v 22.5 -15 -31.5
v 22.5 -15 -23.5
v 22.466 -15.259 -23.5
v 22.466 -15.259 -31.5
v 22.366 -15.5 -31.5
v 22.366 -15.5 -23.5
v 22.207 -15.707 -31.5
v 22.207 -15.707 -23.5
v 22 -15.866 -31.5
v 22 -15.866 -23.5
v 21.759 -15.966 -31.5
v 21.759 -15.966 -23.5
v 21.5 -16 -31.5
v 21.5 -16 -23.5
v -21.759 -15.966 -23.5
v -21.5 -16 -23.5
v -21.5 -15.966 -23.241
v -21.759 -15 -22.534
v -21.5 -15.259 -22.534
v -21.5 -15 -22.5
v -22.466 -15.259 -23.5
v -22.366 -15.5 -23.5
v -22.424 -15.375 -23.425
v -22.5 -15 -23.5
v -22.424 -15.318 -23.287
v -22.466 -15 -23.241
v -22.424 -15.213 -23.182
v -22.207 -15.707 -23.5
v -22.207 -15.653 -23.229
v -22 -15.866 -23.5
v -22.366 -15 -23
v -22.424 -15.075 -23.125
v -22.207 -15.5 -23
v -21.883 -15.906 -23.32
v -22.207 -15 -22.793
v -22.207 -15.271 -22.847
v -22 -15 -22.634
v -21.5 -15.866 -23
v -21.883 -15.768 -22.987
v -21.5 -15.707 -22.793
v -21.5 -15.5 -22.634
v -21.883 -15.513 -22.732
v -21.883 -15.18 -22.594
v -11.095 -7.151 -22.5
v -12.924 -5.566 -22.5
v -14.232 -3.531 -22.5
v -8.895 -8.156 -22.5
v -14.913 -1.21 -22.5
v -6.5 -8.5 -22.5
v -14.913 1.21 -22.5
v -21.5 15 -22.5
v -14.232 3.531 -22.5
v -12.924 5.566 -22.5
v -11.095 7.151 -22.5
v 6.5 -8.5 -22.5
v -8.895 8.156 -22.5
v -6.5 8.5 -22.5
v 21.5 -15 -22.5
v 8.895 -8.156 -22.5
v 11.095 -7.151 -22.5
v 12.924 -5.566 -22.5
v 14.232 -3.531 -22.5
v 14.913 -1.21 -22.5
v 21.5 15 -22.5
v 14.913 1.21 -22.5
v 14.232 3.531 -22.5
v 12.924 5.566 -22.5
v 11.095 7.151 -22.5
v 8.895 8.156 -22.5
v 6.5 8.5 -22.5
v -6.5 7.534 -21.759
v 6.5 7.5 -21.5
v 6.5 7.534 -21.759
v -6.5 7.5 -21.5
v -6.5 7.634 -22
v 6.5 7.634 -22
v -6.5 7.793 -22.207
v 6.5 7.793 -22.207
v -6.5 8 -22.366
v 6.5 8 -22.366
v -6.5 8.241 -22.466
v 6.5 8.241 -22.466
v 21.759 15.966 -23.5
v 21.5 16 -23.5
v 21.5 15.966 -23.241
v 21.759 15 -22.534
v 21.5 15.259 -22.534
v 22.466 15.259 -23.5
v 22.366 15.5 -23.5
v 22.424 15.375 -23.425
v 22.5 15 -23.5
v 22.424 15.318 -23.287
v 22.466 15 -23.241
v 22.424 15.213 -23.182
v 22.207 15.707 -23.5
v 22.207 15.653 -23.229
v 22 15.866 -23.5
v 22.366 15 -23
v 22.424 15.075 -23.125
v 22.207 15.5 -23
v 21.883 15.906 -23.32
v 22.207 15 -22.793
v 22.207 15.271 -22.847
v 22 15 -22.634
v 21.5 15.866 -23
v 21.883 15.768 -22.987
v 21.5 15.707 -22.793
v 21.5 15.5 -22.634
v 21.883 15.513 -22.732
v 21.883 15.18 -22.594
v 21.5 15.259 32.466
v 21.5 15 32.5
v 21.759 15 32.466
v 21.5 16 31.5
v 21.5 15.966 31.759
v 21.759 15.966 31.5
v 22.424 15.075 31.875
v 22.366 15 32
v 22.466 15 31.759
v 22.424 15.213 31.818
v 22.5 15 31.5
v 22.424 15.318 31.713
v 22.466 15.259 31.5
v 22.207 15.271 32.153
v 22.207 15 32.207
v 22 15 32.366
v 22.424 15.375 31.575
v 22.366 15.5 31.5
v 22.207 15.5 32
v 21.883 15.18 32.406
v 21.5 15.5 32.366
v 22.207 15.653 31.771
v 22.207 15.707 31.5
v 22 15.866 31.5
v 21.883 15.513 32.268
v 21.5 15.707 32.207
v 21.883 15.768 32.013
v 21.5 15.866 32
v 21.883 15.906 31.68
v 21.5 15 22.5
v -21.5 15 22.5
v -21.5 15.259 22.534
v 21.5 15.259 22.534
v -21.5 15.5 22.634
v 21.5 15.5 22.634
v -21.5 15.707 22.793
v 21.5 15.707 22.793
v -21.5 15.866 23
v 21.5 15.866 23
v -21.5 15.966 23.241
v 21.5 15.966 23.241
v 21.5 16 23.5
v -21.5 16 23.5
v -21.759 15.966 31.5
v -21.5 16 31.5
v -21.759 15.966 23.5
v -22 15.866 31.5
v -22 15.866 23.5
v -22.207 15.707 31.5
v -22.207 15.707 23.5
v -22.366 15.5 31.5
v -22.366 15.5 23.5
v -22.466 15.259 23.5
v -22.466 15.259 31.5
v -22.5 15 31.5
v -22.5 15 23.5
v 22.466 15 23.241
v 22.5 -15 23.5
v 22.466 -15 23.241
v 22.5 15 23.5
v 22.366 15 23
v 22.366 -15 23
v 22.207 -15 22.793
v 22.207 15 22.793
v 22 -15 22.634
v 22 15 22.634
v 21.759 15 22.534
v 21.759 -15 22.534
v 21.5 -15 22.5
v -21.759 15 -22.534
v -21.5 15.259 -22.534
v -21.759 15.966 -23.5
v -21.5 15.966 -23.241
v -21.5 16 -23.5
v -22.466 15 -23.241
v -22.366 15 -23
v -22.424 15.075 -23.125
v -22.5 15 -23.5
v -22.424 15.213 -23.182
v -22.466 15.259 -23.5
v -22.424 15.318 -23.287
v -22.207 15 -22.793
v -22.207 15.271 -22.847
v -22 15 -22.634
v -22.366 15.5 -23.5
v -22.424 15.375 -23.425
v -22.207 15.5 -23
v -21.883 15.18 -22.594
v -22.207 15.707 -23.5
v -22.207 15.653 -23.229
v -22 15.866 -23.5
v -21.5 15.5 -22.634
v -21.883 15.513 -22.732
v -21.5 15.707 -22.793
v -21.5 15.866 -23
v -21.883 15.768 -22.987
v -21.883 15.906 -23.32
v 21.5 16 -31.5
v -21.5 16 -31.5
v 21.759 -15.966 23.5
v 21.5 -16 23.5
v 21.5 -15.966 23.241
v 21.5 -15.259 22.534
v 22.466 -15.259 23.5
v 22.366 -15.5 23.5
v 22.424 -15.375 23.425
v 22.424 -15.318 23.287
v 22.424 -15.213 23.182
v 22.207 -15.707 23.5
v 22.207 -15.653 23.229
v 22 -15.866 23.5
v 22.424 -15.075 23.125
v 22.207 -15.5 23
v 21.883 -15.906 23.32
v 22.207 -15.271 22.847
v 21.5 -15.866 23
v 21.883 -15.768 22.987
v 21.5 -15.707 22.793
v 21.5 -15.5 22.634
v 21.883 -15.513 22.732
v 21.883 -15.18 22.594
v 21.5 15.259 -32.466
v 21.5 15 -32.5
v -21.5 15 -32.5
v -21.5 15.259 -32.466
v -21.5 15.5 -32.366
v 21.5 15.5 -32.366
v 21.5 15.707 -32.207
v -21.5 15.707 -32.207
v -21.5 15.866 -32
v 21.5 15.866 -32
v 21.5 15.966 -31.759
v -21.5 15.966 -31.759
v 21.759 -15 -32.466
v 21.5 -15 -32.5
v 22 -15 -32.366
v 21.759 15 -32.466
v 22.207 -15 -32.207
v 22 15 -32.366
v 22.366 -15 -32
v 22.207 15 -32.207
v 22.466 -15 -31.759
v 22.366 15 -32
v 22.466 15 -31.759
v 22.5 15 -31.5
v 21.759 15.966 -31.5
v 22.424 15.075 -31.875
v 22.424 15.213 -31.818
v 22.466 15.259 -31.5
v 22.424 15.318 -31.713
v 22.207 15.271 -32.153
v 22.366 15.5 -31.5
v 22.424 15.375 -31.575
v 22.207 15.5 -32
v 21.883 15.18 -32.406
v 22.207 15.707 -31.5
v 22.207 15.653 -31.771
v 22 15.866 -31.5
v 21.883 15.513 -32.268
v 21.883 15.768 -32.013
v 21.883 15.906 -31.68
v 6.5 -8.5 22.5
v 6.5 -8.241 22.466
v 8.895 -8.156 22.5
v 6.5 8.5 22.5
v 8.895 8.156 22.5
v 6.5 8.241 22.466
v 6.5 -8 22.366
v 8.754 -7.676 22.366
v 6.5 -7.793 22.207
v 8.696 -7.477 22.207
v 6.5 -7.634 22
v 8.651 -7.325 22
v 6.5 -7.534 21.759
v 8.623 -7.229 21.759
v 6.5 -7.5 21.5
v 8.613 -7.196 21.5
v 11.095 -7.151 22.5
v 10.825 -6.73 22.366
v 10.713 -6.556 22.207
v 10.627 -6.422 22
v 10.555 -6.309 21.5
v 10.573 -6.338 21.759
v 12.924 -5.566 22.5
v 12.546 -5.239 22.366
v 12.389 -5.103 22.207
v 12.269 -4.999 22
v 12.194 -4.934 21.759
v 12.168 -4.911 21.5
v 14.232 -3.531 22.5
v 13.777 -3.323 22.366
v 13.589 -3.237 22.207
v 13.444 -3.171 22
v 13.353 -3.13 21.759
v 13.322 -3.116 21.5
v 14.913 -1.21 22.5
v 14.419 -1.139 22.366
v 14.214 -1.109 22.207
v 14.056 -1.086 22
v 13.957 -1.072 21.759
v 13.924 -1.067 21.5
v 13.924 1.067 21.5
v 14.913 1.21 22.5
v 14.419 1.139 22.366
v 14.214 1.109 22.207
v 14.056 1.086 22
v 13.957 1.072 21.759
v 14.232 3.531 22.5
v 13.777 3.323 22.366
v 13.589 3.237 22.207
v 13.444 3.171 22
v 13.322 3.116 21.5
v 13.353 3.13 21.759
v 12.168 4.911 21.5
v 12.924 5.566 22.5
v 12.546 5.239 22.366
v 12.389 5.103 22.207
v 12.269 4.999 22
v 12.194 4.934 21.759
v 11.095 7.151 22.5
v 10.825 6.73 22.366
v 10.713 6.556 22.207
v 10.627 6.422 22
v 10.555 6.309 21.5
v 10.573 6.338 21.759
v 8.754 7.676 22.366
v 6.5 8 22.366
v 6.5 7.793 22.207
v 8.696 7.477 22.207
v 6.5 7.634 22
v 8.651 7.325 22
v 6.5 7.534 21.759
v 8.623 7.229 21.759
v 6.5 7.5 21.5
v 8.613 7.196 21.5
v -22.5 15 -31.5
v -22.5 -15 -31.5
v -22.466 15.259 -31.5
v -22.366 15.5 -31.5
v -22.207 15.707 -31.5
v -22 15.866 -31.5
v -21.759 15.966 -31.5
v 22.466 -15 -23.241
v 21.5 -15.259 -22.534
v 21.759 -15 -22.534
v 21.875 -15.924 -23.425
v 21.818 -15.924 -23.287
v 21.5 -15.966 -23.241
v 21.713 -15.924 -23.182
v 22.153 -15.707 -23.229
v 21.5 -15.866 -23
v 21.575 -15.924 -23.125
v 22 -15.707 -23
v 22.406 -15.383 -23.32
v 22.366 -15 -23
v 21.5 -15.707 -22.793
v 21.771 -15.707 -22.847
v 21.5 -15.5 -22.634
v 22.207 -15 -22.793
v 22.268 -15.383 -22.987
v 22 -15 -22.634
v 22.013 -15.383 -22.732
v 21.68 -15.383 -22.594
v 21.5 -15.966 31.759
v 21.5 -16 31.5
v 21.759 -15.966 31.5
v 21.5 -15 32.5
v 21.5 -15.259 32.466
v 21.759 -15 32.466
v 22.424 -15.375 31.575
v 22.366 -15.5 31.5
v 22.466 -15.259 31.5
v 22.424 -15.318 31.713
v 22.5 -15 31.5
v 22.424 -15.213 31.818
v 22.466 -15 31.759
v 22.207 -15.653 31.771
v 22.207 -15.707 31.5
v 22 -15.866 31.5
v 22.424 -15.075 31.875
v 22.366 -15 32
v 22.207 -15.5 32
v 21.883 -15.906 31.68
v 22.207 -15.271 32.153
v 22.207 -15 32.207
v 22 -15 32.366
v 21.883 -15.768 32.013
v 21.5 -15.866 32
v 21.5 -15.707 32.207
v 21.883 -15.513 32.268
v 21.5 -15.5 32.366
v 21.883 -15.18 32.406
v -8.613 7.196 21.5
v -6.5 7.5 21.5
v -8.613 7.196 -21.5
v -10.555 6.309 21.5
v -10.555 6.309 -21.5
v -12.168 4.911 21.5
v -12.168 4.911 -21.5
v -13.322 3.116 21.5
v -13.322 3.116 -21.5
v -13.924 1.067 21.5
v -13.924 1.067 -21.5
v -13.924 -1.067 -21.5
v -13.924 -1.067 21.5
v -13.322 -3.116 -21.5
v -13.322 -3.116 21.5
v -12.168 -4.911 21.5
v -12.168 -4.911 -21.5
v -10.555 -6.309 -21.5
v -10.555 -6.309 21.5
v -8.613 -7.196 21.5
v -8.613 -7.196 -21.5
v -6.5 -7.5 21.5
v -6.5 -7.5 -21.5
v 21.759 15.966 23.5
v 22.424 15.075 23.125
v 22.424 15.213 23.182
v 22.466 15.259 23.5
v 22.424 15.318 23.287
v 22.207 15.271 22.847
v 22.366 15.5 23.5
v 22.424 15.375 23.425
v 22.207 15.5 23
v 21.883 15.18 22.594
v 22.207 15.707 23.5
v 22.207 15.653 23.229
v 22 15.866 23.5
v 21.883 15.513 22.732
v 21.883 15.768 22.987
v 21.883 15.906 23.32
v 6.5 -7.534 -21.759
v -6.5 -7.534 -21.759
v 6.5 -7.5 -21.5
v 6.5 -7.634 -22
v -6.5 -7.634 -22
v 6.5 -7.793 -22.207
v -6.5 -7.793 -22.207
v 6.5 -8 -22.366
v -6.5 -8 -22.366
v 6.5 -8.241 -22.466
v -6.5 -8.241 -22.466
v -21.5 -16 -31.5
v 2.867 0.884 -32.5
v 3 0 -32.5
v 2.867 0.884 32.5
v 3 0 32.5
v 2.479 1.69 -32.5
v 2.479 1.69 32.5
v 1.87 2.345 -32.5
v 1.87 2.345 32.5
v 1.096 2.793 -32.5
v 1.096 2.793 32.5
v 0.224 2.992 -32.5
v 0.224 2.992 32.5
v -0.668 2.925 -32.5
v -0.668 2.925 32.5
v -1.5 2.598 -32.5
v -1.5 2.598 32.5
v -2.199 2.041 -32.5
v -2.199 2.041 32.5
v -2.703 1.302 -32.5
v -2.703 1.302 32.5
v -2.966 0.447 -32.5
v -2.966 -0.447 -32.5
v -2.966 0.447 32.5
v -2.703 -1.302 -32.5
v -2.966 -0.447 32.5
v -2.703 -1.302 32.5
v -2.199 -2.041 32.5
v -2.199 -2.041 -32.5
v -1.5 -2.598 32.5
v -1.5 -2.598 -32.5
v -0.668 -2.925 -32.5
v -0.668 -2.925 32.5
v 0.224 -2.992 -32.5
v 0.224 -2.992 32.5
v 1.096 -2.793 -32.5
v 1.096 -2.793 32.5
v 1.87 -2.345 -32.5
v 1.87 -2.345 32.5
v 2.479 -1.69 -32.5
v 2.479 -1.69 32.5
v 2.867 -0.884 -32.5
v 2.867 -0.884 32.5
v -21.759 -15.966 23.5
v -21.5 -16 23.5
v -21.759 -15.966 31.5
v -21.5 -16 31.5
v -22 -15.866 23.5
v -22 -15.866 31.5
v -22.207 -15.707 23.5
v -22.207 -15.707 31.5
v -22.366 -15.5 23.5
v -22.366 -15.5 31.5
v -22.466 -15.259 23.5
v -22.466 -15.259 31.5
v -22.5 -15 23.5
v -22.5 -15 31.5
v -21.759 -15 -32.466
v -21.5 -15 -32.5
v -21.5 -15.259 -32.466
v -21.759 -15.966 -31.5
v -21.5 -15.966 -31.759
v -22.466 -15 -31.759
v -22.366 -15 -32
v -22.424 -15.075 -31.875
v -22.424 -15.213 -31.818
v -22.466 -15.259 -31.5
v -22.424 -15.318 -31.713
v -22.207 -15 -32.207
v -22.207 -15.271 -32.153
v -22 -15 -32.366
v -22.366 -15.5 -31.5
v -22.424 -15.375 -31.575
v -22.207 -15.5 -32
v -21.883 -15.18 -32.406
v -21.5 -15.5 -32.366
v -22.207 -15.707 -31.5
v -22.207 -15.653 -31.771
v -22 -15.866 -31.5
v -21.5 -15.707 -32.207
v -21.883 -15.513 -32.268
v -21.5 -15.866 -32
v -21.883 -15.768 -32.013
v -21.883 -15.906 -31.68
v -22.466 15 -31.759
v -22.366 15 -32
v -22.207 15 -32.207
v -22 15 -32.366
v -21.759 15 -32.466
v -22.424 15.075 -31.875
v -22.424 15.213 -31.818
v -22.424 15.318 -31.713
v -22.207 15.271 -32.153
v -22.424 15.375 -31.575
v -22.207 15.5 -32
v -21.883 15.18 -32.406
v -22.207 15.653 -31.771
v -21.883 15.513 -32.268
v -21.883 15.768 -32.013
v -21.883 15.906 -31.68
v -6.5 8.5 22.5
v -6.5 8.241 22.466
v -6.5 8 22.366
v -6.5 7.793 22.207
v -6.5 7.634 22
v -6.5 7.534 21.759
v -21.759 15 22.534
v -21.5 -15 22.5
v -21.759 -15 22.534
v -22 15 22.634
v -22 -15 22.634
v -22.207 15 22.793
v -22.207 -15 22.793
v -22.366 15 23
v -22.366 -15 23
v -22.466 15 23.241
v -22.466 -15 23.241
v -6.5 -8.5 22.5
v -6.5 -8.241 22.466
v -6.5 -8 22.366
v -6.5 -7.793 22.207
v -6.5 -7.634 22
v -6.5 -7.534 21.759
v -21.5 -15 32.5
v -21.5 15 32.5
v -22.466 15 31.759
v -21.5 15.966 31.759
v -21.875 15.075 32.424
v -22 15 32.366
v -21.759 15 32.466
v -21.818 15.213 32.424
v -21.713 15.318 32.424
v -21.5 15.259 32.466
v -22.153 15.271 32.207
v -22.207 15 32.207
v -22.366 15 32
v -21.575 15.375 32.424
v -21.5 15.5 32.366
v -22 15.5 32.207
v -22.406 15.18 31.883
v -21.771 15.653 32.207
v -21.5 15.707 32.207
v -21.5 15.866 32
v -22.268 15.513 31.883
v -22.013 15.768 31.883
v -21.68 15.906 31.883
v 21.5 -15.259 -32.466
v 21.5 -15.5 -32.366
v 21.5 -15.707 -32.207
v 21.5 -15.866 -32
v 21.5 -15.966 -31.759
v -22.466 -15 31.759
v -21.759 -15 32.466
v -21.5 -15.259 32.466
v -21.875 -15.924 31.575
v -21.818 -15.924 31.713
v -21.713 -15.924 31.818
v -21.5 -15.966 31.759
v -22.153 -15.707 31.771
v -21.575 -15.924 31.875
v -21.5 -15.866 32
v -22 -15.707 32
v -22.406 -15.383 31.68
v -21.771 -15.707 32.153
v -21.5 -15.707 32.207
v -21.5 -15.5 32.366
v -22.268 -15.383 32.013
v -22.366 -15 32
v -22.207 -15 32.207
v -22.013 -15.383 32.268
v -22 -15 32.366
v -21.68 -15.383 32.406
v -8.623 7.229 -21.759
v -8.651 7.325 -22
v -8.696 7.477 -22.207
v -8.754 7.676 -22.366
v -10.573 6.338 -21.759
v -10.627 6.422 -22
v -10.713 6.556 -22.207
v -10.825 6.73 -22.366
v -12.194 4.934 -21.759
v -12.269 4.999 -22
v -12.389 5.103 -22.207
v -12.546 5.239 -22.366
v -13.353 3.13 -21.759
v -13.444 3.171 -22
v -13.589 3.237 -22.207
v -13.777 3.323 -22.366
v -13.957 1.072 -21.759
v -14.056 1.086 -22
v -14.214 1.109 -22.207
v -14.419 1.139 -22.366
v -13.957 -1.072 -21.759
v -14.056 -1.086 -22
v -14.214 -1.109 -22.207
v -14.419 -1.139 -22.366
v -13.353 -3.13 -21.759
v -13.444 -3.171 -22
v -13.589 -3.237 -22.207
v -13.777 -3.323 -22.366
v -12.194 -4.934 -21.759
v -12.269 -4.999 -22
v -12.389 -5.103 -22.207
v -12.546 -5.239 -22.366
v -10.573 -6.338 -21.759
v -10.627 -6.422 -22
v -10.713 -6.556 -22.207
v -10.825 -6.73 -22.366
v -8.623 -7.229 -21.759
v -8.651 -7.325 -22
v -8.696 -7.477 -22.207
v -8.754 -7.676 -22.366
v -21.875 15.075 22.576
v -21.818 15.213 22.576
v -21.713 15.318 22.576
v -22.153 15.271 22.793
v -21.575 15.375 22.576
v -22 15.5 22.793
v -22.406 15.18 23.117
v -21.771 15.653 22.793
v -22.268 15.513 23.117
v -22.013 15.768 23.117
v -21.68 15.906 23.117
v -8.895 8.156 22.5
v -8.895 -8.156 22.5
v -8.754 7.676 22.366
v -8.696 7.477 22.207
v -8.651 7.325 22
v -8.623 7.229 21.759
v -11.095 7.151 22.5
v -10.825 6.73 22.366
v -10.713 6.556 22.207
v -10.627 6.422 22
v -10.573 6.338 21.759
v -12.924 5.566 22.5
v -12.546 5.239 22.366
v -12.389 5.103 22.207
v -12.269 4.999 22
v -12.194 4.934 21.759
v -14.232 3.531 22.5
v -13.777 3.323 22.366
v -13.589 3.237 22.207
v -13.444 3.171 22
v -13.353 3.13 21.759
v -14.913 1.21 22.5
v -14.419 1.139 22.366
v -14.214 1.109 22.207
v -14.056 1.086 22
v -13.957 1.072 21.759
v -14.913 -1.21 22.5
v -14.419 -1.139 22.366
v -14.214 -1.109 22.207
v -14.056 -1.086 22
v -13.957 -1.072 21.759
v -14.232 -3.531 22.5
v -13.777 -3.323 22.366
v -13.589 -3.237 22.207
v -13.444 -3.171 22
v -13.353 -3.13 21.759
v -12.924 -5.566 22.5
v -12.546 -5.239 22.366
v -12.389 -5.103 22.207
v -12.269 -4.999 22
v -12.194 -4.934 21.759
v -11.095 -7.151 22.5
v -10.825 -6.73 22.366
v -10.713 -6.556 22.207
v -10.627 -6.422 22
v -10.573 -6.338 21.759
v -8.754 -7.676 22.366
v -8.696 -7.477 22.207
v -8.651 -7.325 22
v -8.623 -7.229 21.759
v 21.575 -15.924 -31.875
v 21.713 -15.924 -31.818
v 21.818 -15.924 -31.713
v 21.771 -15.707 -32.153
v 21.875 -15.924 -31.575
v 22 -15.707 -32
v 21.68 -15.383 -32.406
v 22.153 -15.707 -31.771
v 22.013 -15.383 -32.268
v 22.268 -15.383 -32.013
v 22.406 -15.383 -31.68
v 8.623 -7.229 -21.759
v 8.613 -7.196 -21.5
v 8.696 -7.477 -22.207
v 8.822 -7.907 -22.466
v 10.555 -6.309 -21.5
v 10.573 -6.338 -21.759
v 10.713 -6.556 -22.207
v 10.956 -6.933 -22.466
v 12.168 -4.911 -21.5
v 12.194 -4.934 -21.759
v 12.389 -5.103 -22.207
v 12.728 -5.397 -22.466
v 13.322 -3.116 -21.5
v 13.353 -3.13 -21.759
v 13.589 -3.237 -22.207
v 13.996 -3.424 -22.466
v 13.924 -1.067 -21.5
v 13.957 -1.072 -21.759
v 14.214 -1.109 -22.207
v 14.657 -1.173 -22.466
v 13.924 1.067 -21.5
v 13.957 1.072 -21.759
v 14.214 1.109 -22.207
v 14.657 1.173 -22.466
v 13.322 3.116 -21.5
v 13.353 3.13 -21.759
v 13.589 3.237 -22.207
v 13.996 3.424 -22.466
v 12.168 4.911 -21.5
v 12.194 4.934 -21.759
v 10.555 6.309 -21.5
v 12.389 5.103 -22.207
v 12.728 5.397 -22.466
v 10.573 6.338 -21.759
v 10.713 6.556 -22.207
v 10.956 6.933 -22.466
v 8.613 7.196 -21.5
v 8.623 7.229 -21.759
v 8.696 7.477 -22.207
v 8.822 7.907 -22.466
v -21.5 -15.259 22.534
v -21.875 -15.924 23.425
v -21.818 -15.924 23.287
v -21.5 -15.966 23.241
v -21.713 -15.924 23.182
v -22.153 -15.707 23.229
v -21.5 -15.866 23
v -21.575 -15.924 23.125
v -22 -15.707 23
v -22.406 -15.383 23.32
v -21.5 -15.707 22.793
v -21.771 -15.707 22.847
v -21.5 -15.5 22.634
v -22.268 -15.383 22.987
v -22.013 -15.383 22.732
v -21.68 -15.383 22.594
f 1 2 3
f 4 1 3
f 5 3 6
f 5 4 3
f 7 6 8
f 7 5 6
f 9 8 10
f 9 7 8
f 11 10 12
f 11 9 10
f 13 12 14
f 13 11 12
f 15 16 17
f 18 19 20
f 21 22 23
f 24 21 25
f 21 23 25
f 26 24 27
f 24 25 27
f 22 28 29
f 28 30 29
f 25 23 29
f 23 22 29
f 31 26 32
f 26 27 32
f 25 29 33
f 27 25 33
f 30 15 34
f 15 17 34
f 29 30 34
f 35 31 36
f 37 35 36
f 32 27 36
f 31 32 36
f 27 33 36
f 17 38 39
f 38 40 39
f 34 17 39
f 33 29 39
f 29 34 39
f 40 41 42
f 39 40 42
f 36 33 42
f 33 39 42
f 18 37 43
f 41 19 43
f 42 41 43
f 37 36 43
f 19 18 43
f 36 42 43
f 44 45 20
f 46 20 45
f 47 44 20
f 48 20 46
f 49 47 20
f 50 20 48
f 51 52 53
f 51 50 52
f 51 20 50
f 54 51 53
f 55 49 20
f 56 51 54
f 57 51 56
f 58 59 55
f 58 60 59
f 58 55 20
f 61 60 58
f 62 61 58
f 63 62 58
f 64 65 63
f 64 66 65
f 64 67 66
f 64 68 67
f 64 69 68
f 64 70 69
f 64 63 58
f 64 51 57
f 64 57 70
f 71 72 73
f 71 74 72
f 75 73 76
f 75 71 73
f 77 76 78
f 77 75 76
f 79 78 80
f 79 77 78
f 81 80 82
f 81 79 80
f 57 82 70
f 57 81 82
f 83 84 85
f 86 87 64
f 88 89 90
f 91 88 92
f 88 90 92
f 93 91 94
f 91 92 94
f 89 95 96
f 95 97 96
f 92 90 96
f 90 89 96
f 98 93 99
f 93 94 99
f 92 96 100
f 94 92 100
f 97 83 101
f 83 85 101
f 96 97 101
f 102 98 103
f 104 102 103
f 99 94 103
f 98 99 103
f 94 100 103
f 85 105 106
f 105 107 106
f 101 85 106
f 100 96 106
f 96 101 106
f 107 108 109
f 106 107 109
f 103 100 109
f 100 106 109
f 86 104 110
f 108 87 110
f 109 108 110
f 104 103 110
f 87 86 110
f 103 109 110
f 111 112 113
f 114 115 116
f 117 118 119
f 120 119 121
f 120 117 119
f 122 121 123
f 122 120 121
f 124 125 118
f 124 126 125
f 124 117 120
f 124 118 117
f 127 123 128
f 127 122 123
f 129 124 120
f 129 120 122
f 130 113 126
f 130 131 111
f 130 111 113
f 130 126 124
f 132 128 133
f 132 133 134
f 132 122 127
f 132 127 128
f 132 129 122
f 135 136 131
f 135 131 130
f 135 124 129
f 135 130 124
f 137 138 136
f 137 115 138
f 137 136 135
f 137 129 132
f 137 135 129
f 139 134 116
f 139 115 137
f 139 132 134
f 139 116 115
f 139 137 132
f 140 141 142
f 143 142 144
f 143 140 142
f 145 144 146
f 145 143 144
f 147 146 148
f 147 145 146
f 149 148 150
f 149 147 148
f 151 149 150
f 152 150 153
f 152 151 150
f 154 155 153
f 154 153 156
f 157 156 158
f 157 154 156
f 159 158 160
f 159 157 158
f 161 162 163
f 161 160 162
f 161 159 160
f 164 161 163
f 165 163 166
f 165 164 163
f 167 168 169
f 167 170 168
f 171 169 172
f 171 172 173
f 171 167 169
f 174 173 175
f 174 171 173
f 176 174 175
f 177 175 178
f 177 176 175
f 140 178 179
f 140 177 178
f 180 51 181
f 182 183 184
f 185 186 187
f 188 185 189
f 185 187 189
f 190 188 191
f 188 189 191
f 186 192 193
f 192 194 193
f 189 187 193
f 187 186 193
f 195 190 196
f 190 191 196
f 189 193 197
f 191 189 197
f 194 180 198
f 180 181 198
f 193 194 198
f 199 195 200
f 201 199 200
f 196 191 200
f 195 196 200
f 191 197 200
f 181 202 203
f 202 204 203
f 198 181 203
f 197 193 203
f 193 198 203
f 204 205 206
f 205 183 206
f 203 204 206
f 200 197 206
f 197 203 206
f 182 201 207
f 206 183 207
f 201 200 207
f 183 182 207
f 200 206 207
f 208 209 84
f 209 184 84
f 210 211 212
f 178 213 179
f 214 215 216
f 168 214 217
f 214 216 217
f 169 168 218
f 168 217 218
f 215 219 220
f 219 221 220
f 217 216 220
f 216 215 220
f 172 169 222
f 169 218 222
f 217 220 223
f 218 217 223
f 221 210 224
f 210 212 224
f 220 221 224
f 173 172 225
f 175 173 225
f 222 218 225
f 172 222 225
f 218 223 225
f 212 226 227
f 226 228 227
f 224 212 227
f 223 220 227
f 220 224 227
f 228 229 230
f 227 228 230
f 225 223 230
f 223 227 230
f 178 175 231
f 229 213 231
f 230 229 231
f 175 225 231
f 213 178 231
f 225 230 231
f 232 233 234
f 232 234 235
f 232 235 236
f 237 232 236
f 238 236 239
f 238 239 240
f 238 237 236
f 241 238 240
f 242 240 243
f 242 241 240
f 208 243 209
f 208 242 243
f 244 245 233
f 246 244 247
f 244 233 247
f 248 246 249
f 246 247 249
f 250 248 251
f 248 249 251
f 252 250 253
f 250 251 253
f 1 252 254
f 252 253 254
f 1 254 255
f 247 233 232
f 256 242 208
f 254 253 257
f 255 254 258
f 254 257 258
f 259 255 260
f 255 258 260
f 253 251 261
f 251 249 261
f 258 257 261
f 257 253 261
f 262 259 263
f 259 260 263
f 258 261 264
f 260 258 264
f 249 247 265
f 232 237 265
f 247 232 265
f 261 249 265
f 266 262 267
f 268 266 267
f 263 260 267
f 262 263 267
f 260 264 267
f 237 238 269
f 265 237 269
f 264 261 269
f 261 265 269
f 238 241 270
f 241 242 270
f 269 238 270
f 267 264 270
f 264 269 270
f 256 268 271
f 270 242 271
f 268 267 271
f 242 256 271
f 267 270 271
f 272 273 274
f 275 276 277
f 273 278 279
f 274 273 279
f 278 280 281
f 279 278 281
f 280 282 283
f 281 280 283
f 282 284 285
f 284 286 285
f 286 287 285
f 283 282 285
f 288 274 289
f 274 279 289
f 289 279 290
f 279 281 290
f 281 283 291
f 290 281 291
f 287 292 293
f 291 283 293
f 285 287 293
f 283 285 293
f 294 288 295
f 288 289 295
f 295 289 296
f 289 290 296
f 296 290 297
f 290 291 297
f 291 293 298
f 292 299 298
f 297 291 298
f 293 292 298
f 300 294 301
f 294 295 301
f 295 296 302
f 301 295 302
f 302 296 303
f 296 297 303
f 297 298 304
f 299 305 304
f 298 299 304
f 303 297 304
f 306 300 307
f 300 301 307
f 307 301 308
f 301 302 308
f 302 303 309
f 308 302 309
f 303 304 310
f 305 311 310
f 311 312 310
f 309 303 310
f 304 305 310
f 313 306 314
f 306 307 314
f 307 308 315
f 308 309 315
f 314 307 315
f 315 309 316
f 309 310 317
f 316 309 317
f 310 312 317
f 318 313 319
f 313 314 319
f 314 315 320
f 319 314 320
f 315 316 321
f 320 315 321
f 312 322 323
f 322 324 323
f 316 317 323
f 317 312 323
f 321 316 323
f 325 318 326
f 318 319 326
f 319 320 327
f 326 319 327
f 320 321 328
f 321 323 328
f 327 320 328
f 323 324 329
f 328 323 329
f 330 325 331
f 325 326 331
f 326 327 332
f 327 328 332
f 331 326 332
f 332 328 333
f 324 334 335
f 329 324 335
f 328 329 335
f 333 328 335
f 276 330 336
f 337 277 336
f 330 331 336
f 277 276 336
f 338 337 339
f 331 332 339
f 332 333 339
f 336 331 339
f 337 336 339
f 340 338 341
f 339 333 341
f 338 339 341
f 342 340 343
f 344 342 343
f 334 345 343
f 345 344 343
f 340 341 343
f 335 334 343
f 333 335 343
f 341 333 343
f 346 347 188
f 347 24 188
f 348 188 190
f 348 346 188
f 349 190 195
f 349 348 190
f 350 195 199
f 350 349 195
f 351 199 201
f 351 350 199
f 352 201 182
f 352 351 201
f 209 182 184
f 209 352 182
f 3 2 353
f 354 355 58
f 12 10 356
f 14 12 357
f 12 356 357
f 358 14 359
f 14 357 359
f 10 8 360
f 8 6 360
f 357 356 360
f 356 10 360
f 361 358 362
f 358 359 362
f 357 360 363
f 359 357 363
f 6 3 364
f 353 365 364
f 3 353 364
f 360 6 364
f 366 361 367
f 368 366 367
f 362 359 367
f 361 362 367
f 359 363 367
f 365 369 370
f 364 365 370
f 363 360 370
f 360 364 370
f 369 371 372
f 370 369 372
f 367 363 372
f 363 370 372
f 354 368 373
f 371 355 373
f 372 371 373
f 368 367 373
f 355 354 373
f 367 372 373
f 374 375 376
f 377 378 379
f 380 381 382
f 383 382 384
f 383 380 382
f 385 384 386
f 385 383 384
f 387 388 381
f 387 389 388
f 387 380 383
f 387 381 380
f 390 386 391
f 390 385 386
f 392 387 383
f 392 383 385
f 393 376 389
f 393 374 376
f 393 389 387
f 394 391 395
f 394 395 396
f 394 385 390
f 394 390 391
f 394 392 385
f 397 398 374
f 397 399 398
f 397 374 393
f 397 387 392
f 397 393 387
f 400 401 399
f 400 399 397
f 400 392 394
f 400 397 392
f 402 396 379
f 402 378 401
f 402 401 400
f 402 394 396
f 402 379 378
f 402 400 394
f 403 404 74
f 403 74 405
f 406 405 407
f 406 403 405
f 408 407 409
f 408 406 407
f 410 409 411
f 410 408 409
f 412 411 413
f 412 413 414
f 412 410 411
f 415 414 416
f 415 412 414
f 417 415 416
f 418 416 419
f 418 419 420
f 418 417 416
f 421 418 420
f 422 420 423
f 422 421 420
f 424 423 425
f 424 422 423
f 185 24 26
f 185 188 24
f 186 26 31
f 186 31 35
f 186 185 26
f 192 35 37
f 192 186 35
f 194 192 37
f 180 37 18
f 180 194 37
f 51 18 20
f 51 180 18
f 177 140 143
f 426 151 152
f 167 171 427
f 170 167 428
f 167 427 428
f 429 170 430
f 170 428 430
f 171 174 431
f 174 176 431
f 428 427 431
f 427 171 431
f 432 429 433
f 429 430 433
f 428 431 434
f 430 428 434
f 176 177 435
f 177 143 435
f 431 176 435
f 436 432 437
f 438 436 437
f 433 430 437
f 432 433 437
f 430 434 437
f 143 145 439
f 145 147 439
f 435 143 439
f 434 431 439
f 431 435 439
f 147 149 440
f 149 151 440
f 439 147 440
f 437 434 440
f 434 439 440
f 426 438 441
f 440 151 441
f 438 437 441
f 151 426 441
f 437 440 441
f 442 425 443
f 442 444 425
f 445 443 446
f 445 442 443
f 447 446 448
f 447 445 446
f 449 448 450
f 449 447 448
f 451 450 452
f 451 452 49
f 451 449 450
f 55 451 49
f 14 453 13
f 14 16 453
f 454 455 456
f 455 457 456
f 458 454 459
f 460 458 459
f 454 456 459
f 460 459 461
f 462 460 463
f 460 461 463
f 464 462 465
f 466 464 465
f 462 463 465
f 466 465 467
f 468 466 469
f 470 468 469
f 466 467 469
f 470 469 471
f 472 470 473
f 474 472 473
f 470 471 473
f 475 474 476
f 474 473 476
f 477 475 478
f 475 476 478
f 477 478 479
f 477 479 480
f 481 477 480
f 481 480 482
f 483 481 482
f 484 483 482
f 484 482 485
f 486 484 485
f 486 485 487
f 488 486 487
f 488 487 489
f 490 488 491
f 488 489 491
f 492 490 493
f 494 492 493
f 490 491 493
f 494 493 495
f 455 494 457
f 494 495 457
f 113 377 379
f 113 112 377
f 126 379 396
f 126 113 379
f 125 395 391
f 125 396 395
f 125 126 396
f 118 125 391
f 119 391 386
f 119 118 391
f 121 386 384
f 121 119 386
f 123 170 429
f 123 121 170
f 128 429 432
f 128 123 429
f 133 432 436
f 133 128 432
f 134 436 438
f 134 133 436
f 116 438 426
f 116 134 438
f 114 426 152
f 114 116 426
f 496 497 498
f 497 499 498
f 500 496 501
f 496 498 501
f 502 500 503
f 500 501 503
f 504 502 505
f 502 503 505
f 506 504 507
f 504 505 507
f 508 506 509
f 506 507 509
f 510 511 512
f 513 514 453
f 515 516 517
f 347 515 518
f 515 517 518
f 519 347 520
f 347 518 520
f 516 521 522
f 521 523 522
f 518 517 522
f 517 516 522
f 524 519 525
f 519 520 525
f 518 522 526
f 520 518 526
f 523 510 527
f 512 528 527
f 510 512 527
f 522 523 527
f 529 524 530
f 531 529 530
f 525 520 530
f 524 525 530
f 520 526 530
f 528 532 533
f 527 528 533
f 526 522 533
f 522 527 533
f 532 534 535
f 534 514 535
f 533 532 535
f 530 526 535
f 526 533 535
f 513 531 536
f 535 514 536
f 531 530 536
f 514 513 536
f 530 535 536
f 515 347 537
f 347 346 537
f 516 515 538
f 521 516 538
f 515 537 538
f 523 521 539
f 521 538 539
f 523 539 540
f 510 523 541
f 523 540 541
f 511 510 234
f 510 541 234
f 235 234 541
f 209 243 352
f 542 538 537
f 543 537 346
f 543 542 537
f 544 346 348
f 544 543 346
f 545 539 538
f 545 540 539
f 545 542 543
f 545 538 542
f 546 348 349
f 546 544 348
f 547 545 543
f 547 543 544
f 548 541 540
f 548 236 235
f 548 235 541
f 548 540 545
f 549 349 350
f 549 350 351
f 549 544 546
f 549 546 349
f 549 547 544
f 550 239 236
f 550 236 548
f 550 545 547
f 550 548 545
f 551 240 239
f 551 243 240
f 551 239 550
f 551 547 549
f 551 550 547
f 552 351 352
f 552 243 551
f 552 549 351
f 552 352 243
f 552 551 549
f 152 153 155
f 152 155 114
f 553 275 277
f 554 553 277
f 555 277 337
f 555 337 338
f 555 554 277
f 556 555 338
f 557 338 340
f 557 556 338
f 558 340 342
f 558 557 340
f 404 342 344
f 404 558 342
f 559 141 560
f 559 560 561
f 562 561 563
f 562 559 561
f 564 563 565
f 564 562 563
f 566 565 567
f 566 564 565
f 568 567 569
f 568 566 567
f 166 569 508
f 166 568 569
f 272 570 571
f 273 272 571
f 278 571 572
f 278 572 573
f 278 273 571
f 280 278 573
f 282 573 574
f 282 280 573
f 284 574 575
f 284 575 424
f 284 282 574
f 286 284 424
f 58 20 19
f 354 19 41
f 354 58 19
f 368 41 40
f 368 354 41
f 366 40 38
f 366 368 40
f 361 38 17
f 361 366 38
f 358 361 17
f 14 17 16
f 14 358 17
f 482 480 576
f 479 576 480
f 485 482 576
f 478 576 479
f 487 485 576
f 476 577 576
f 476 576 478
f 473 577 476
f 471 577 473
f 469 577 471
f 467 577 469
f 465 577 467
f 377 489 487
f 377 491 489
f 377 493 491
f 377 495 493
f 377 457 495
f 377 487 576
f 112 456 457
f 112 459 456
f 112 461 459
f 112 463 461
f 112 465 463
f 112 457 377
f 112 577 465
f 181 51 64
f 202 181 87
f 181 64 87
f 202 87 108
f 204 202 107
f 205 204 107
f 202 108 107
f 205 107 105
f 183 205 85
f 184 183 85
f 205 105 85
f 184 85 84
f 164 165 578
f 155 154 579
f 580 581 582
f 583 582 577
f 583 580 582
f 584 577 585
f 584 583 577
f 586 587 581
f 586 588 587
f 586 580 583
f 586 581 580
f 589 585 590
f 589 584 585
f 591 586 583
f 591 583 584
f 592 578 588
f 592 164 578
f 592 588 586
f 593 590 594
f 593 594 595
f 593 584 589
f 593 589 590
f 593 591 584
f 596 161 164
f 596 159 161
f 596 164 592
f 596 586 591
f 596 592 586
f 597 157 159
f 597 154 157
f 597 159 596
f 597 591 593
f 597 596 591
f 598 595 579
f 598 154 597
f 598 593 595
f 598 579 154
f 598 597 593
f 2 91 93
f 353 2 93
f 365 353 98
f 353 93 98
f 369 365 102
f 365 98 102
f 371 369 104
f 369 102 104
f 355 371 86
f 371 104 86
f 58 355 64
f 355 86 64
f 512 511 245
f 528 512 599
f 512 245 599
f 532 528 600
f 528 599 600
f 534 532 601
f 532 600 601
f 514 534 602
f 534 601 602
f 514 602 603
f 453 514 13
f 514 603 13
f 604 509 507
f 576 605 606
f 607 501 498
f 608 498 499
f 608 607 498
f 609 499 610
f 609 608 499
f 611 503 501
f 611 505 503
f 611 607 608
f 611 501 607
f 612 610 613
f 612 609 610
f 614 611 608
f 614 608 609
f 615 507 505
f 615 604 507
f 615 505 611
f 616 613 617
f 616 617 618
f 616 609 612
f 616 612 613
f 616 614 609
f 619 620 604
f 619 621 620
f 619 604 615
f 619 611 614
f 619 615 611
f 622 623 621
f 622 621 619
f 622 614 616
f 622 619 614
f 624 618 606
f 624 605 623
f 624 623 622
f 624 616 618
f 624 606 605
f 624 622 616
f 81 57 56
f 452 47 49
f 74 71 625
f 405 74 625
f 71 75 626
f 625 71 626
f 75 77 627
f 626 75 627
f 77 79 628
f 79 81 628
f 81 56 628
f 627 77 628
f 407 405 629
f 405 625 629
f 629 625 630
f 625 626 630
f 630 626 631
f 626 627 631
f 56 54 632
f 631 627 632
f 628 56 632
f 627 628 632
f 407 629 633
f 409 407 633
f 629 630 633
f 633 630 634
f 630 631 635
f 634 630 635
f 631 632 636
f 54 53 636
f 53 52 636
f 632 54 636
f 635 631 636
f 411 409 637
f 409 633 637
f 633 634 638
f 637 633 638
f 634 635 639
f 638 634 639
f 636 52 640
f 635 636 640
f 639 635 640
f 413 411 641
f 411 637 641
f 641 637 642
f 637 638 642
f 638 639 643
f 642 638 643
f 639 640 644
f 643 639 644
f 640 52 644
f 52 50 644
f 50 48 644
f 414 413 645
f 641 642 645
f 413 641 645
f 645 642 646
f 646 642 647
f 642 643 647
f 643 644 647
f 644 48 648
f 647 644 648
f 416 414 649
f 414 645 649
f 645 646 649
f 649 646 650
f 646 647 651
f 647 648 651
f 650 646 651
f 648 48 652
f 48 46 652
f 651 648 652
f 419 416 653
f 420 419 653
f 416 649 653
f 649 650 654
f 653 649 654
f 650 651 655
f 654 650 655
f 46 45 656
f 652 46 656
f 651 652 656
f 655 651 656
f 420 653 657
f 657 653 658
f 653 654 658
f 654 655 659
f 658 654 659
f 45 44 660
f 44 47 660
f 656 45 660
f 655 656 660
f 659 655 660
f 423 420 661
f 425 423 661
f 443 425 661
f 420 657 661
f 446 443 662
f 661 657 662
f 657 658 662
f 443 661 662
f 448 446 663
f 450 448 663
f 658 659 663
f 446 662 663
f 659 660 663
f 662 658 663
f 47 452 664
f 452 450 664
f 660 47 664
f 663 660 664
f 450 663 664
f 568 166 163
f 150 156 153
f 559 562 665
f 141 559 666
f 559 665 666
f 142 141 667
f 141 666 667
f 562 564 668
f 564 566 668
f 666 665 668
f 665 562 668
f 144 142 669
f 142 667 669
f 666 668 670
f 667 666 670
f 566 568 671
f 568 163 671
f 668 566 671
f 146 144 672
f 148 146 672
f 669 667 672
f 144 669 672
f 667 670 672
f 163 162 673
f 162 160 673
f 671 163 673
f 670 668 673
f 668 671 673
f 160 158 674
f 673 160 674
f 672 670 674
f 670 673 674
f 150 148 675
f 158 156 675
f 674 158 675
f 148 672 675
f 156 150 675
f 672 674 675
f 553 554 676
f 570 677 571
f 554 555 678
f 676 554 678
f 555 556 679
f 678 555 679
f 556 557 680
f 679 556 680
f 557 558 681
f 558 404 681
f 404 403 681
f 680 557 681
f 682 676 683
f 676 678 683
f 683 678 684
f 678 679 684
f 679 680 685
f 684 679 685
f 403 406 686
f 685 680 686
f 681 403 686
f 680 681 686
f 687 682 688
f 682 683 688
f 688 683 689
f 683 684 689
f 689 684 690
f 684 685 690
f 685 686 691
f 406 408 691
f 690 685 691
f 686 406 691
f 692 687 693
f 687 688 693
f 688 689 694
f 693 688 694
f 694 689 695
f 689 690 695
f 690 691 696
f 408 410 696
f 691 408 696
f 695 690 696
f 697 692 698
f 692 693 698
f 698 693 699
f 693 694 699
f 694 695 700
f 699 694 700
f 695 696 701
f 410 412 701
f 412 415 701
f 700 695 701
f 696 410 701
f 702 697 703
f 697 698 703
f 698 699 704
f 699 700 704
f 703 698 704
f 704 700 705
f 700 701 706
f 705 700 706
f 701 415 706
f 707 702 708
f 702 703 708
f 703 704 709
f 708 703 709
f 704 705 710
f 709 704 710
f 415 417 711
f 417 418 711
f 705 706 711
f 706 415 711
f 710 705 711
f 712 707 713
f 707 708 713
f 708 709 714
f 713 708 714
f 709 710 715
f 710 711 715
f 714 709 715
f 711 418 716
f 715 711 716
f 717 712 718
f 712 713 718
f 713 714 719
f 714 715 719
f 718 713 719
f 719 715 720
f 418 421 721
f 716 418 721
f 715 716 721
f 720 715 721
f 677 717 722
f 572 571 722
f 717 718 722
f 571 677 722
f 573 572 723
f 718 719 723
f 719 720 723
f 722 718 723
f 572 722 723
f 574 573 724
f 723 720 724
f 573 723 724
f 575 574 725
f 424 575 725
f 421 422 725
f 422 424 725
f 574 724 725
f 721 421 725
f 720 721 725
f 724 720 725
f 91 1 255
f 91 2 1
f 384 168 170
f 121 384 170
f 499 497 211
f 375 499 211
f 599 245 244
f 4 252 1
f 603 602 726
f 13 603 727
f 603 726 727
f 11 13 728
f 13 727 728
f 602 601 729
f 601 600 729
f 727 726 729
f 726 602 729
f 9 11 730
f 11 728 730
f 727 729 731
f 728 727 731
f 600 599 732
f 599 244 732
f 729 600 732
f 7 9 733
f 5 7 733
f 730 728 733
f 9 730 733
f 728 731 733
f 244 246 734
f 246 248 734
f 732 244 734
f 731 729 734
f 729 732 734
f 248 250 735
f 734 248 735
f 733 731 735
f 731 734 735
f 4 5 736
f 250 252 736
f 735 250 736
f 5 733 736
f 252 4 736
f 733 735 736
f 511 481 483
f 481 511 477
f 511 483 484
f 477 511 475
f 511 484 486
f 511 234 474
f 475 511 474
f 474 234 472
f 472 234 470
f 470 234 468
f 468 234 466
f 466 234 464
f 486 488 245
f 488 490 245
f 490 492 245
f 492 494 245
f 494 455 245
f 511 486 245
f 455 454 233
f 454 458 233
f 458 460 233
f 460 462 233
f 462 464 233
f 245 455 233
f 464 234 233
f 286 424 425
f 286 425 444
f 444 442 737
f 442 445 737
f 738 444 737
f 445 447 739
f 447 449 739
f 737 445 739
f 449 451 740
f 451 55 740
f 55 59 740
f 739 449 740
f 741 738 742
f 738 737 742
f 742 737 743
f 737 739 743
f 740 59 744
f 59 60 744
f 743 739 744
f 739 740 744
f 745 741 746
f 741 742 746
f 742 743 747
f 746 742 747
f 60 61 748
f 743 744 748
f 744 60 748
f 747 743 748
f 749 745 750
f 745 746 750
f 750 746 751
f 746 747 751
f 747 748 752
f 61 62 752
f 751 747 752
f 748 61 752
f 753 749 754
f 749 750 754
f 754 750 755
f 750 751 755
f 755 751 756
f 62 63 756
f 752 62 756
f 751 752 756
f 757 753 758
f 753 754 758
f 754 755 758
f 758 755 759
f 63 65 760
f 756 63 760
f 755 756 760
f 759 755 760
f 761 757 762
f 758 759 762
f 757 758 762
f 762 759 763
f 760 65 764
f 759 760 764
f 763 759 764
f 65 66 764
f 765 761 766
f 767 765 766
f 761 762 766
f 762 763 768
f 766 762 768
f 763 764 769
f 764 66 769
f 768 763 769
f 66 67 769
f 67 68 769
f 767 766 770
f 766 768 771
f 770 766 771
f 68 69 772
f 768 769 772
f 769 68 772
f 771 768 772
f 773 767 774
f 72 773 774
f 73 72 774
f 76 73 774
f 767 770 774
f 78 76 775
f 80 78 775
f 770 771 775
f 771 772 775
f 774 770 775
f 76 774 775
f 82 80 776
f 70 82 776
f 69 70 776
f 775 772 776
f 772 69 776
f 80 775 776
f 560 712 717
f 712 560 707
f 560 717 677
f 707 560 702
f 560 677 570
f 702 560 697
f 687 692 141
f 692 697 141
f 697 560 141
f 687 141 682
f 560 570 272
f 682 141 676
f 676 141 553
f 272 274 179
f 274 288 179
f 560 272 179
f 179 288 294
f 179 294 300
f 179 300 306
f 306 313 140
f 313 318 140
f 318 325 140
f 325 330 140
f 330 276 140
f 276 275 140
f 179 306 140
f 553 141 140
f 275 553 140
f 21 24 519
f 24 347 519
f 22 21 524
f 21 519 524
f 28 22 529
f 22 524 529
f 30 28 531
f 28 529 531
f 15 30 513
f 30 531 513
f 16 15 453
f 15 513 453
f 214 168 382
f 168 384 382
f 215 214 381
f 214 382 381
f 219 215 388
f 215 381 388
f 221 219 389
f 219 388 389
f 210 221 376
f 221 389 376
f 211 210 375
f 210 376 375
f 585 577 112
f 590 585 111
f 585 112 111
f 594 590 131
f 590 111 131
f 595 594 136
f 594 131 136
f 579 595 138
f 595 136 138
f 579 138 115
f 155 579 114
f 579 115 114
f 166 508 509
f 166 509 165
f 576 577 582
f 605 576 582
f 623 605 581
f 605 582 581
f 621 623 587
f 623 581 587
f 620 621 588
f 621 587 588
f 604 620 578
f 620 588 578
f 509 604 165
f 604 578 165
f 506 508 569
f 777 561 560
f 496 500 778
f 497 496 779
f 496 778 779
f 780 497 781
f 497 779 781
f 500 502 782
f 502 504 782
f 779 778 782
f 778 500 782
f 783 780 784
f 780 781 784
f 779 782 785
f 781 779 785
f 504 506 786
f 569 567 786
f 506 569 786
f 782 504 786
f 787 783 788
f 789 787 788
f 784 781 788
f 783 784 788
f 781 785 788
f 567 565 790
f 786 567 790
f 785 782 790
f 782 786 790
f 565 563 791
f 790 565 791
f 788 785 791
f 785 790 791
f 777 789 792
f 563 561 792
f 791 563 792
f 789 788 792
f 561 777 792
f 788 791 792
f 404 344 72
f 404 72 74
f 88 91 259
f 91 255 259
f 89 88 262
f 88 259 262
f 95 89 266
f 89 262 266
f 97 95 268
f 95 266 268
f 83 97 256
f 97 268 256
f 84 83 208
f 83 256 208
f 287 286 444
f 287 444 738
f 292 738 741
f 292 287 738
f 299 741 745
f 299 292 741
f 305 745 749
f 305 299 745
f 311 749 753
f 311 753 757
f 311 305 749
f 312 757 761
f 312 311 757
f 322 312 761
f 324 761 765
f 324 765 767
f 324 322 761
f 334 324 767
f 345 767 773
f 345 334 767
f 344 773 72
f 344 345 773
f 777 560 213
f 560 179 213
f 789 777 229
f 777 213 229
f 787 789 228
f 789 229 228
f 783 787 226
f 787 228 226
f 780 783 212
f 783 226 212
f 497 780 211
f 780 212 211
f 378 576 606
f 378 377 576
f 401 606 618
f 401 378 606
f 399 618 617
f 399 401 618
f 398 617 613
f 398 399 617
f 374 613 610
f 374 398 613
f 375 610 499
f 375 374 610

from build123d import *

# Parameters (mm, degrees)
F0_R     = 3
F1_DEPTH = 22.5
F4_W     = 45
F4_H     = 32
F4_R     = 3
F5_DEPTH = 10
F6_W     = 45
F6_H     = 32
F6_R     = 3
F7_DEPTH = 10
F8_R     = 1


with BuildPart() as f1:
    # F0 (on Top) → F1 (new body, symmetric)
    with BuildSketch(Plane.XY):
        with BuildLine():
            ThreePointArc((6.5, -7.5), (14, 0), (6.5, 7.5))
            Line((6.5, 7.5), (-6.5, 7.5))
            ThreePointArc((-6.5, 7.5), (-14, 0), (-6.5, -7.5))
            Line((-6.5, -7.5), (6.5, -7.5))
        make_face()
        Circle(F0_R, mode=Mode.SUBTRACT)
    extrude(amount=F1_DEPTH, both=True)

    # F4 (on offset) → F5 (join)
    with BuildSketch(Plane.XY.offset(22.5)):
        Rectangle(F4_W, F4_H)
        Circle(F4_R, mode=Mode.SUBTRACT)
    extrude(amount=F5_DEPTH)

    # F6 (on offset) → F7 (join)
    with BuildSketch(Plane.XY.offset(-22.5)):
        Rectangle(F6_W, F6_H)
        Circle(F6_R, mode=Mode.SUBTRACT)
    extrude(amount=-F7_DEPTH)

    # F8
    f8_edges = [f1.edges().sort_by_distance(p)[0] for p in [
        (0, 16, -32.5),
        (22.5, 0, -32.5),
        (0, -16, -32.5),
        (-22.5, 0, -32.5),
        (0, 16, -22.5),
        (22.5, 16, -27.5),
        (22.5, 0, -22.5),
        (22.5, -16, -27.5),
        (0, -16, -22.5),
        (-22.5, -16, -27.5),
        (-22.5, 0, -22.5),
        (-22.5, 16, -27.5),
        (0, 7.5, -22.5),
        (-14, 0, 22.5),
        (-22.5, 16, 27.5),
        (-22.5, 0, 22.5),
        (0, 16, 22.5),
        (-22.5, 0, 32.5),
        (0, 16, 32.5),
        (-22.5, -16, 27.5),
        (0, -16, 32.5),
        (0, -16, 22.5),
        (22.5, -16, 27.5),
        (22.5, 0, 22.5),
        (22.5, 0, 32.5),
        (22.5, 16, 27.5),
    ]]
    fillet(f8_edges, radius=F8_R)


solid = f1.part
